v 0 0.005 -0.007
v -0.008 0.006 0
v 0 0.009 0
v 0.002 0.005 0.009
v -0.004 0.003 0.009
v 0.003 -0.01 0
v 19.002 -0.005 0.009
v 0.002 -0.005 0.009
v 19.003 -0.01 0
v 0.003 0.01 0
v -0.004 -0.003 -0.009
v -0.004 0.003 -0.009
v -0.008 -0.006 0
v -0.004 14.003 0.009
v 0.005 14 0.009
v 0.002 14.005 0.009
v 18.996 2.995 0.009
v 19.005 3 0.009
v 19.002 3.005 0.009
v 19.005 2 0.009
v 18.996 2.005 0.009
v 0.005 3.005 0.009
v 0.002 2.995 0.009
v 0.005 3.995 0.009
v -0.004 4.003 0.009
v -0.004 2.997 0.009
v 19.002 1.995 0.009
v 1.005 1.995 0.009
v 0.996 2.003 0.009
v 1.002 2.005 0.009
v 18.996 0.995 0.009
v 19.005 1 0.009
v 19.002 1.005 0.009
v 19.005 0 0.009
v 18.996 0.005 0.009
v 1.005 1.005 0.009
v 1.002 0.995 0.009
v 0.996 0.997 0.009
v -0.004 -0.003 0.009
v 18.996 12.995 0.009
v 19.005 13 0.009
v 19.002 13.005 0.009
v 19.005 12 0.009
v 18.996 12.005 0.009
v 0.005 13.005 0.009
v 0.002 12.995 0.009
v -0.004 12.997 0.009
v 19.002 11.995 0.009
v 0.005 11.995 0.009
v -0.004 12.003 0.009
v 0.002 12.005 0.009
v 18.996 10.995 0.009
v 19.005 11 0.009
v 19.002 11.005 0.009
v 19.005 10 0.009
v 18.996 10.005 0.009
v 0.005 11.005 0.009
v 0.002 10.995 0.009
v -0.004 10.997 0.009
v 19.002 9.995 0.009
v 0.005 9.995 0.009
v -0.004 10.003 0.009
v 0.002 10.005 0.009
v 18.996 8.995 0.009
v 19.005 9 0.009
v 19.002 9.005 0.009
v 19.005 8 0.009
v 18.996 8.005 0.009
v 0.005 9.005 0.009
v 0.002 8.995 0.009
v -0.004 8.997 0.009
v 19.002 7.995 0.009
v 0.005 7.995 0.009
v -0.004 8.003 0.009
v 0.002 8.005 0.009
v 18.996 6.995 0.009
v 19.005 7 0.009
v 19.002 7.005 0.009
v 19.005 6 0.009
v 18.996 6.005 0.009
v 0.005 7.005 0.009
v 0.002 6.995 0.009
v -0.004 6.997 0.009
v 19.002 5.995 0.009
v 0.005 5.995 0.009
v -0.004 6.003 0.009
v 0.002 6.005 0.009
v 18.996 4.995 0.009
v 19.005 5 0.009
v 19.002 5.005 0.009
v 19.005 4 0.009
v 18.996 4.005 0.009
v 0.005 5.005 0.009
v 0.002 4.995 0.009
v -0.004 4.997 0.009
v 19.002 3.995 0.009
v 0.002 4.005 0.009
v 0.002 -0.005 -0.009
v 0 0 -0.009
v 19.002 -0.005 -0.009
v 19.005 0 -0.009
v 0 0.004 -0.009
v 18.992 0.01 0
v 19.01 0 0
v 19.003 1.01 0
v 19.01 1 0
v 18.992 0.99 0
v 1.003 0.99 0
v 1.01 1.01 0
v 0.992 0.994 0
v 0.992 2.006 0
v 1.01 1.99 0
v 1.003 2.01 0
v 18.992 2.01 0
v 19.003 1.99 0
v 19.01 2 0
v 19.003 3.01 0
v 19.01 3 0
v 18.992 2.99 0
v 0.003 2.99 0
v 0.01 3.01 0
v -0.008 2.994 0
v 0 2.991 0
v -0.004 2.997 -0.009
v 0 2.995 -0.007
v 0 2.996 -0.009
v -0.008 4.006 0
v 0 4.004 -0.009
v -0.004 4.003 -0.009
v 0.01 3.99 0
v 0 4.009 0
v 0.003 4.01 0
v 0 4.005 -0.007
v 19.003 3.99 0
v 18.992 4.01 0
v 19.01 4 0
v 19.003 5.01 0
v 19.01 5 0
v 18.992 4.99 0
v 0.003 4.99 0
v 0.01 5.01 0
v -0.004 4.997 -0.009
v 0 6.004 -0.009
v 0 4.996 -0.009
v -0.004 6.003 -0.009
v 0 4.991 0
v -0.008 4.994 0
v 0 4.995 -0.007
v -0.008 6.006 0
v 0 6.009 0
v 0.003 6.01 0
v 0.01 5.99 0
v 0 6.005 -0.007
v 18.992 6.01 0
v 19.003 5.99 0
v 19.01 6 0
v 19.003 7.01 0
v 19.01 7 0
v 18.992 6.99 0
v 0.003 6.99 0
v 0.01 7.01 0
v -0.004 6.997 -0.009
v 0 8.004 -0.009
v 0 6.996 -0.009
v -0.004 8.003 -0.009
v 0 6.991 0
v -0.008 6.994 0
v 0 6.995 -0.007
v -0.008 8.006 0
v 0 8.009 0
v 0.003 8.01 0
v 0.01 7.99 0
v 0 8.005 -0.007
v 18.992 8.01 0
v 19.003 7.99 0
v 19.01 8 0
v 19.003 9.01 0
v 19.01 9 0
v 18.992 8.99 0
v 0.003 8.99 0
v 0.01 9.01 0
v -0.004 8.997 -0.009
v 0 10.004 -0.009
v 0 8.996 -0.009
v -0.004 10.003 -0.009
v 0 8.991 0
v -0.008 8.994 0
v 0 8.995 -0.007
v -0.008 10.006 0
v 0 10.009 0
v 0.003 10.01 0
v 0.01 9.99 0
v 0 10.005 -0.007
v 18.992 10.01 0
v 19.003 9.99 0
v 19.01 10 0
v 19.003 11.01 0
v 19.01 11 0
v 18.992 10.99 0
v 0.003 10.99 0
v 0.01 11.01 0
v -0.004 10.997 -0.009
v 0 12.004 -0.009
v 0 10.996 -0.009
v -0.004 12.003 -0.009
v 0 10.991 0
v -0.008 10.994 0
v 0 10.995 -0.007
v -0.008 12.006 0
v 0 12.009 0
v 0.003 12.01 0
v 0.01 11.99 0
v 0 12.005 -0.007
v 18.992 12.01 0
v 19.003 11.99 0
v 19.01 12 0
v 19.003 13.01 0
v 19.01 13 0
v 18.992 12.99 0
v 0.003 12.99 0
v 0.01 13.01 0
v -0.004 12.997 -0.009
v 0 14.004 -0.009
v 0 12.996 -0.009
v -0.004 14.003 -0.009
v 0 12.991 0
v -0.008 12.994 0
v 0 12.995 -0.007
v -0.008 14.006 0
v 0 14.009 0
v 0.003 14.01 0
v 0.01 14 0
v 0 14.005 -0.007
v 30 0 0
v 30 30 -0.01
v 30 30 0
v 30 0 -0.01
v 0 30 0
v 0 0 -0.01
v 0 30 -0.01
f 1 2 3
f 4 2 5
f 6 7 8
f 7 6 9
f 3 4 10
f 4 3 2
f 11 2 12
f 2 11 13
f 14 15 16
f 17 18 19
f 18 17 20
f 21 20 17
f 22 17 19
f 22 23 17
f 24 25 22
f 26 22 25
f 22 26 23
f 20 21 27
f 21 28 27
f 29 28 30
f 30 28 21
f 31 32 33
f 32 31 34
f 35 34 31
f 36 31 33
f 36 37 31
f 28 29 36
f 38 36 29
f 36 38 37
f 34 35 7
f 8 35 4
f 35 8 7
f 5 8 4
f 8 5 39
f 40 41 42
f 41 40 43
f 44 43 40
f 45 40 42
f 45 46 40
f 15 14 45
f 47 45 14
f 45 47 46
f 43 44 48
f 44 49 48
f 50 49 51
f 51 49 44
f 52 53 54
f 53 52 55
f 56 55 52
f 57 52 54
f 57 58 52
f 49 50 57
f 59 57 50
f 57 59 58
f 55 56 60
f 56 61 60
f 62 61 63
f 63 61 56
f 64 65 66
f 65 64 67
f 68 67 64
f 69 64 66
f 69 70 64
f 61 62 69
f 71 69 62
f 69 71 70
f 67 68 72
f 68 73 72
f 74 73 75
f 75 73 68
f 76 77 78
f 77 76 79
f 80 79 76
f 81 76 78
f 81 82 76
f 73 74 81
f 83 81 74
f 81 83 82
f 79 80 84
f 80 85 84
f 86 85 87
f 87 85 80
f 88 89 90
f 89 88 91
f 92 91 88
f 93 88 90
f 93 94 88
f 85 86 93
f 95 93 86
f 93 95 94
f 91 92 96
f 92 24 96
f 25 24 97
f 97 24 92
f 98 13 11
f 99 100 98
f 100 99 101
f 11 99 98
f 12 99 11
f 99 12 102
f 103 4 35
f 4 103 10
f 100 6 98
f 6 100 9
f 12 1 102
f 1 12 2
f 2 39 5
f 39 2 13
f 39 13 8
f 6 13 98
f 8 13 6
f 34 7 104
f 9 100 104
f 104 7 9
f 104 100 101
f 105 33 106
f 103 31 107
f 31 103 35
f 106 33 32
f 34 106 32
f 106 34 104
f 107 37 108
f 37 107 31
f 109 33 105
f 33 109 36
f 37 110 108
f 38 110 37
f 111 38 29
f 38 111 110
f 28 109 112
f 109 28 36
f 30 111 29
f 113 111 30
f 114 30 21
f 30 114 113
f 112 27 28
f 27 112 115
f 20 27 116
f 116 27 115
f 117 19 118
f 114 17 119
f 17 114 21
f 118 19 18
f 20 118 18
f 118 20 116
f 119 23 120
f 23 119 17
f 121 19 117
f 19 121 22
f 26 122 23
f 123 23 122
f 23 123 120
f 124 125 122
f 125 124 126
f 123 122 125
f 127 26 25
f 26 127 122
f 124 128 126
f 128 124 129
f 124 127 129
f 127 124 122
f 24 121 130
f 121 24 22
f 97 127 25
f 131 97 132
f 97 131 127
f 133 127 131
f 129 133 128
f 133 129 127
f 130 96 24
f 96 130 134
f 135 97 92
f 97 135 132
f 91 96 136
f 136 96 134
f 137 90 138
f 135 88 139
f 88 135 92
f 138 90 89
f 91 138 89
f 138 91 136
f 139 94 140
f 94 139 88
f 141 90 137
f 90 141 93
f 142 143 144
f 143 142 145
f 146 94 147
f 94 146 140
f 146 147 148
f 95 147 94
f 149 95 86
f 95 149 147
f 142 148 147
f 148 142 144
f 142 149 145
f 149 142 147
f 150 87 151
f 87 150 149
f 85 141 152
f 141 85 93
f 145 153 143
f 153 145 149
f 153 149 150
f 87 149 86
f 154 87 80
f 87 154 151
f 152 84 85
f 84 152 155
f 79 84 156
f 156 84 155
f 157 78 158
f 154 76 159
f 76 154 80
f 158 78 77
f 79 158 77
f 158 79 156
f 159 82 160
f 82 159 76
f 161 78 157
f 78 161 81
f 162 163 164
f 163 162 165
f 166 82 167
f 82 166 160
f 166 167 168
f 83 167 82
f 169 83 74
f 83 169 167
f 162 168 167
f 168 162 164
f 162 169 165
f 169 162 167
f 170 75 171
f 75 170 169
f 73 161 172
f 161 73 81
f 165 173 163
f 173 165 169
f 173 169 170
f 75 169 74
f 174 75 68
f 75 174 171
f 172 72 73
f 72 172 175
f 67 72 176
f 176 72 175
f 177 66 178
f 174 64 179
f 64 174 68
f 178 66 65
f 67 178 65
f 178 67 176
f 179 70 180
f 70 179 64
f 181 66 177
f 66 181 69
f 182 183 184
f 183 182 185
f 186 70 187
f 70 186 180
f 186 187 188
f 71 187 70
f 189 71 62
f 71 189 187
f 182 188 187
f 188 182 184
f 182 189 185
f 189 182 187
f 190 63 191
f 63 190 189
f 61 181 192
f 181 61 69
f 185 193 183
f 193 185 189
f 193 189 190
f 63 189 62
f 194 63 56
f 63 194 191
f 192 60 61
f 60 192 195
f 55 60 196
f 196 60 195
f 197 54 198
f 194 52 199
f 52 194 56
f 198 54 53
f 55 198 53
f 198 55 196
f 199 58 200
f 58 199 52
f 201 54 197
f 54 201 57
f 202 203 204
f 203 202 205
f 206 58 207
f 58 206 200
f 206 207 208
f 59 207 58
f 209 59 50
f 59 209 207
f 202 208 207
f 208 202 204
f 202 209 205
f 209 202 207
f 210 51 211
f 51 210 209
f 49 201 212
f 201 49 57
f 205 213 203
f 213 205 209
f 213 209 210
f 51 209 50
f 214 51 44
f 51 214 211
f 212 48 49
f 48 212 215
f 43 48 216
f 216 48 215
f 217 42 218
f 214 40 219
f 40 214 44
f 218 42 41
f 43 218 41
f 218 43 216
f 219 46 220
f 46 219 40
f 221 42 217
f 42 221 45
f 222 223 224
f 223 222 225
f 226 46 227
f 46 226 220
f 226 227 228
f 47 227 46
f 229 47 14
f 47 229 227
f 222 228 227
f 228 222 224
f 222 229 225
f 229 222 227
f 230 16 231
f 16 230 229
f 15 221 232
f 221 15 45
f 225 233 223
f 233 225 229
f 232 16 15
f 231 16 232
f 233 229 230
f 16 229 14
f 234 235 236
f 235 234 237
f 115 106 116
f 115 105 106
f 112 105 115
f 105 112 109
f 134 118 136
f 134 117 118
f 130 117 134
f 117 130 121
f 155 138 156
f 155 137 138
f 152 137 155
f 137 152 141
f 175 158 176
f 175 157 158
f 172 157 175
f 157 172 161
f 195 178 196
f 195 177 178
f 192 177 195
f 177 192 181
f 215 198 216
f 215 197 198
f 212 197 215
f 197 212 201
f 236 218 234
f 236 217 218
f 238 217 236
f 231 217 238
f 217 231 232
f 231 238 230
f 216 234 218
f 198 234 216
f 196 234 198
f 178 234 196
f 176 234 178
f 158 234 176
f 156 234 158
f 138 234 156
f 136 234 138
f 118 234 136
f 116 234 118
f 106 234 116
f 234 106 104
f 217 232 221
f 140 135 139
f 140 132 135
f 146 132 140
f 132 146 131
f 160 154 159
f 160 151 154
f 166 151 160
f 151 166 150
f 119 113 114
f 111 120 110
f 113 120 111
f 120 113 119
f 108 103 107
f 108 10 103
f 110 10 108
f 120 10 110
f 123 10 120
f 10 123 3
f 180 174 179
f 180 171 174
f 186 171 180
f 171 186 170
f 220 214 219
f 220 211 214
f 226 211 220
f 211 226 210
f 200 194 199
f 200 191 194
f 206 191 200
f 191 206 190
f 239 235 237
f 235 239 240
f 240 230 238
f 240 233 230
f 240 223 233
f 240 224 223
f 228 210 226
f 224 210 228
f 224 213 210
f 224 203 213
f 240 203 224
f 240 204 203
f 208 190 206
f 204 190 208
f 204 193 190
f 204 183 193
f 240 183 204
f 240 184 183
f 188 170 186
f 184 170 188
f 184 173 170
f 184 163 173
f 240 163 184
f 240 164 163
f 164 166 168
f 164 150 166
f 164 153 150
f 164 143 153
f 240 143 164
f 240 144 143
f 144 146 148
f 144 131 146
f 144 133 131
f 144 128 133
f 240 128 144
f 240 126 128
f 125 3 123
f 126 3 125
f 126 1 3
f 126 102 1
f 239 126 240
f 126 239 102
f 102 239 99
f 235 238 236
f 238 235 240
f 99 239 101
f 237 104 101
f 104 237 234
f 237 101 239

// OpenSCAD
hull(){
    translate([0, 0]) sphere(0.01);
    translate([1, 0]) sphere(0.01);
}
hull(){
    translate([1, 0]) sphere(0.01);
    translate([2, 0]) sphere(0.01);
}
hull(){
    translate([2, 0]) sphere(0.01);
    translate([3, 0]) sphere(0.01);
}
hull(){
    translate([3, 0]) sphere(0.01);
    translate([4, 0]) sphere(0.01);
}
hull(){
    translate([4, 0]) sphere(0.01);
    translate([5, 0]) sphere(0.01);
}
hull(){
    translate([5, 0]) sphere(0.01);
    translate([6, 0]) sphere(0.01);
}
hull(){
    translate([6, 0]) sphere(0.01);
    translate([7, 0]) sphere(0.01);
}
hull(){
    translate([7, 0]) sphere(0.01);
    translate([8, 0]) sphere(0.01);
}
hull(){
    translate([8, 0]) sphere(0.01);
    translate([9, 0]) sphere(0.01);
}
hull(){
    translate([9, 0]) sphere(0.01);
    translate([10, 0]) sphere(0.01);
}
hull(){
    translate([10, 0]) sphere(0.01);
    translate([11, 0]) sphere(0.01);
}
hull(){
    translate([11, 0]) sphere(0.01);
    translate([12, 0]) sphere(0.01);
}
hull(){
    translate([12, 0]) sphere(0.01);
    translate([13, 0]) sphere(0.01);
}
hull(){
    translate([13, 0]) sphere(0.01);
    translate([14, 0]) sphere(0.01);
}
hull(){
    translate([14, 0]) sphere(0.01);
    translate([15, 0]) sphere(0.01);
}
hull(){
    translate([15, 0]) sphere(0.01);
    translate([16, 0]) sphere(0.01);
}
hull(){
    translate([16, 0]) sphere(0.01);
    translate([17, 0]) sphere(0.01);
}
hull(){
    translate([17, 0]) sphere(0.01);
    translate([18, 0]) sphere(0.01);
}
hull(){
    translate([18, 0]) sphere(0.01);
    translate([19, 0]) sphere(0.01);
}
hull(){
    translate([19, 0]) sphere(0.01);
    translate([19, 1]) sphere(0.01);
}
hull(){
    translate([19, 1]) sphere(0.01);
    translate([18, 1]) sphere(0.01);
}
hull(){
    translate([18, 1]) sphere(0.01);
    translate([17, 1]) sphere(0.01);
}
hull(){
    translate([17, 1]) sphere(0.01);
    translate([16, 1]) sphere(0.01);
}
hull(){
    translate([16, 1]) sphere(0.01);
    translate([15, 1]) sphere(0.01);
}
hull(){
    translate([15, 1]) sphere(0.01);
    translate([14, 1]) sphere(0.01);
}
hull(){
    translate([14, 1]) sphere(0.01);
    translate([13, 1]) sphere(0.01);
}
hull(){
    translate([13, 1]) sphere(0.01);
    translate([12, 1]) sphere(0.01);
}
hull(){
    translate([12, 1]) sphere(0.01);
    translate([11, 1]) sphere(0.01);
}
hull(){
    translate([11, 1]) sphere(0.01);
    translate([10, 1]) sphere(0.01);
}
hull(){
    translate([10, 1]) sphere(0.01);
    translate([9, 1]) sphere(0.01);
}
hull(){
    translate([9, 1]) sphere(0.01);
    translate([8, 1]) sphere(0.01);
}
hull(){
    translate([8, 1]) sphere(0.01);
    translate([7, 1]) sphere(0.01);
}
hull(){
    translate([7, 1]) sphere(0.01);
    translate([6, 1]) sphere(0.01);
}
hull(){
    translate([6, 1]) sphere(0.01);
    translate([5, 1]) sphere(0.01);
}
hull(){
    translate([5, 1]) sphere(0.01);
    translate([4, 1]) sphere(0.01);
}
hull(){
    translate([4, 1]) sphere(0.01);
    translate([3, 1]) sphere(0.01);
}
hull(){
    translate([3, 1]) sphere(0.01);
    translate([2, 1]) sphere(0.01);
}
hull(){
    translate([2, 1]) sphere(0.01);
    translate([1, 1]) sphere(0.01);
}
hull(){
    translate([1, 1]) sphere(0.01);
    translate([1, 2]) sphere(0.01);
}
hull(){
    translate([1, 2]) sphere(0.01);
    translate([2, 2]) sphere(0.01);
}
hull(){
    translate([2, 2]) sphere(0.01);
    translate([3, 2]) sphere(0.01);
}
hull(){
    translate([3, 2]) sphere(0.01);
    translate([4, 2]) sphere(0.01);
}
hull(){
    translate([4, 2]) sphere(0.01);
    translate([5, 2]) sphere(0.01);
}
hull(){
    translate([5, 2]) sphere(0.01);
    translate([6, 2]) sphere(0.01);
}
hull(){
    translate([6, 2]) sphere(0.01);
    translate([7, 2]) sphere(0.01);
}
hull(){
    translate([7, 2]) sphere(0.01);
    translate([8, 2]) sphere(0.01);
}
hull(){
    translate([8, 2]) sphere(0.01);
    translate([9, 2]) sphere(0.01);
}
hull(){
    translate([9, 2]) sphere(0.01);
    translate([10, 2]) sphere(0.01);
}
hull(){
    translate([10, 2]) sphere(0.01);
    translate([11, 2]) sphere(0.01);
}
hull(){
    translate([11, 2]) sphere(0.01);
    translate([12, 2]) sphere(0.01);
}
hull(){
    translate([12, 2]) sphere(0.01);
    translate([13, 2]) sphere(0.01);
}
hull(){
    translate([13, 2]) sphere(0.01);
    translate([14, 2]) sphere(0.01);
}
hull(){
    translate([14, 2]) sphere(0.01);
    translate([15, 2]) sphere(0.01);
}
hull(){
    translate([15, 2]) sphere(0.01);
    translate([16, 2]) sphere(0.01);
}
hull(){
    translate([16, 2]) sphere(0.01);
    translate([17, 2]) sphere(0.01);
}
hull(){
    translate([17, 2]) sphere(0.01);
    translate([18, 2]) sphere(0.01);
}
hull(){
    translate([18, 2]) sphere(0.01);
    translate([19, 2]) sphere(0.01);
}
hull(){
    translate([19, 2]) sphere(0.01);
    translate([19, 3]) sphere(0.01);
}
hull(){
    translate([19, 3]) sphere(0.01);
    translate([18, 3]) sphere(0.01);
}
hull(){
    translate([18, 3]) sphere(0.01);
    translate([17, 3]) sphere(0.01);
}
hull(){
    translate([17, 3]) sphere(0.01);
    translate([16, 3]) sphere(0.01);
}
hull(){
    translate([16, 3]) sphere(0.01);
    translate([15, 3]) sphere(0.01);
}
hull(){
    translate([15, 3]) sphere(0.01);
    translate([14, 3]) sphere(0.01);
}
hull(){
    translate([14, 3]) sphere(0.01);
    translate([13, 3]) sphere(0.01);
}
hull(){
    translate([13, 3]) sphere(0.01);
    translate([12, 3]) sphere(0.01);
}
hull(){
    translate([12, 3]) sphere(0.01);
    translate([11, 3]) sphere(0.01);
}
hull(){
    translate([11, 3]) sphere(0.01);
    translate([10, 3]) sphere(0.01);
}
hull(){
    translate([10, 3]) sphere(0.01);
    translate([9, 3]) sphere(0.01);
}
hull(){
    translate([9, 3]) sphere(0.01);
    translate([8, 3]) sphere(0.01);
}
hull(){
    translate([8, 3]) sphere(0.01);
    translate([7, 3]) sphere(0.01);
}
hull(){
    translate([7, 3]) sphere(0.01);
    translate([6, 3]) sphere(0.01);
}
hull(){
    translate([6, 3]) sphere(0.01);
    translate([5, 3]) sphere(0.01);
}
hull(){
    translate([5, 3]) sphere(0.01);
    translate([4, 3]) sphere(0.01);
}
hull(){
    translate([4, 3]) sphere(0.01);
    translate([3, 3]) sphere(0.01);
}
hull(){
    translate([3, 3]) sphere(0.01);
    translate([2, 3]) sphere(0.01);
}
hull(){
    translate([2, 3]) sphere(0.01);
    translate([1, 3]) sphere(0.01);
}
hull(){
    translate([1, 3]) sphere(0.01);
    translate([0, 3]) sphere(0.01);
}
hull(){
    translate([0, 3]) sphere(0.01);
    translate([0, 4]) sphere(0.01);
}
hull(){
    translate([0, 4]) sphere(0.01);
    translate([1, 4]) sphere(0.01);
}
hull(){
    translate([1, 4]) sphere(0.01);
    translate([2, 4]) sphere(0.01);
}
hull(){
    translate([2, 4]) sphere(0.01);
    translate([3, 4]) sphere(0.01);
}
hull(){
    translate([3, 4]) sphere(0.01);
    translate([4, 4]) sphere(0.01);
}
hull(){
    translate([4, 4]) sphere(0.01);
    translate([5, 4]) sphere(0.01);
}
hull(){
    translate([5, 4]) sphere(0.01);
    translate([6, 4]) sphere(0.01);
}
hull(){
    translate([6, 4]) sphere(0.01);
    translate([7, 4]) sphere(0.01);
}
hull(){
    translate([7, 4]) sphere(0.01);
    translate([8, 4]) sphere(0.01);
}
hull(){
    translate([8, 4]) sphere(0.01);
    translate([9, 4]) sphere(0.01);
}
hull(){
    translate([9, 4]) sphere(0.01);
    translate([10, 4]) sphere(0.01);
}
hull(){
    translate([10, 4]) sphere(0.01);
    translate([11, 4]) sphere(0.01);
}
hull(){
    translate([11, 4]) sphere(0.01);
    translate([12, 4]) sphere(0.01);
}
hull(){
    translate([12, 4]) sphere(0.01);
    translate([13, 4]) sphere(0.01);
}
hull(){
    translate([13, 4]) sphere(0.01);
    translate([14, 4]) sphere(0.01);
}
hull(){
    translate([14, 4]) sphere(0.01);
    translate([15, 4]) sphere(0.01);
}
hull(){
    translate([15, 4]) sphere(0.01);
    translate([16, 4]) sphere(0.01);
}
hull(){
    translate([16, 4]) sphere(0.01);
    translate([17, 4]) sphere(0.01);
}
hull(){
    translate([17, 4]) sphere(0.01);
    translate([18, 4]) sphere(0.01);
}
hull(){
    translate([18, 4]) sphere(0.01);
    translate([19, 4]) sphere(0.01);
}
hull(){
    translate([19, 4]) sphere(0.01);
    translate([19, 5]) sphere(0.01);
}
hull(){
    translate([19, 5]) sphere(0.01);
    translate([18, 5]) sphere(0.01);
}
hull(){
    translate([18, 5]) sphere(0.01);
    translate([17, 5]) sphere(0.01);
}
hull(){
    translate([17, 5]) sphere(0.01);
    translate([16, 5]) sphere(0.01);
}
hull(){
    translate([16, 5]) sphere(0.01);
    translate([15, 5]) sphere(0.01);
}
hull(){
    translate([15, 5]) sphere(0.01);
    translate([14, 5]) sphere(0.01);
}
hull(){
    translate([14, 5]) sphere(0.01);
    translate([13, 5]) sphere(0.01);
}
hull(){
    translate([13, 5]) sphere(0.01);
    translate([12, 5]) sphere(0.01);
}
hull(){
    translate([12, 5]) sphere(0.01);
    translate([11, 5]) sphere(0.01);
}
hull(){
    translate([11, 5]) sphere(0.01);
    translate([10, 5]) sphere(0.01);
}
hull(){
    translate([10, 5]) sphere(0.01);
    translate([9, 5]) sphere(0.01);
}
hull(){
    translate([9, 5]) sphere(0.01);
    translate([8, 5]) sphere(0.01);
}
hull(){
    translate([8, 5]) sphere(0.01);
    translate([7, 5]) sphere(0.01);
}
hull(){
    translate([7, 5]) sphere(0.01);
    translate([6, 5]) sphere(0.01);
}
hull(){
    translate([6, 5]) sphere(0.01);
    translate([5, 5]) sphere(0.01);
}
hull(){
    translate([5, 5]) sphere(0.01);
    translate([4, 5]) sphere(0.01);
}
hull(){
    translate([4, 5]) sphere(0.01);
    translate([3, 5]) sphere(0.01);
}
hull(){
    translate([3, 5]) sphere(0.01);
    translate([2, 5]) sphere(0.01);
}
hull(){
    translate([2, 5]) sphere(0.01);
    translate([1, 5]) sphere(0.01);
}
hull(){
    translate([1, 5]) sphere(0.01);
    translate([0, 5]) sphere(0.01);
}
hull(){
    translate([0, 5]) sphere(0.01);
    translate([0, 6]) sphere(0.01);
}
hull(){
    translate([0, 6]) sphere(0.01);
    translate([1, 6]) sphere(0.01);
}
hull(){
    translate([1, 6]) sphere(0.01);
    translate([2, 6]) sphere(0.01);
}
hull(){
    translate([2, 6]) sphere(0.01);
    translate([3, 6]) sphere(0.01);
}
hull(){
    translate([3, 6]) sphere(0.01);
    translate([4, 6]) sphere(0.01);
}
hull(){
    translate([4, 6]) sphere(0.01);
    translate([5, 6]) sphere(0.01);
}
hull(){
    translate([5, 6]) sphere(0.01);
    translate([6, 6]) sphere(0.01);
}
hull(){
    translate([6, 6]) sphere(0.01);
    translate([7, 6]) sphere(0.01);
}
hull(){
    translate([7, 6]) sphere(0.01);
    translate([8, 6]) sphere(0.01);
}
hull(){
    translate([8, 6]) sphere(0.01);
    translate([9, 6]) sphere(0.01);
}
hull(){
    translate([9, 6]) sphere(0.01);
    translate([10, 6]) sphere(0.01);
}
hull(){
    translate([10, 6]) sphere(0.01);
    translate([11, 6]) sphere(0.01);
}
hull(){
    translate([11, 6]) sphere(0.01);
    translate([12, 6]) sphere(0.01);
}
hull(){
    translate([12, 6]) sphere(0.01);
    translate([13, 6]) sphere(0.01);
}
hull(){
    translate([13, 6]) sphere(0.01);
    translate([14, 6]) sphere(0.01);
}
hull(){
    translate([14, 6]) sphere(0.01);
    translate([15, 6]) sphere(0.01);
}
hull(){
    translate([15, 6]) sphere(0.01);
    translate([16, 6]) sphere(0.01);
}
hull(){
    translate([16, 6]) sphere(0.01);
    translate([17, 6]) sphere(0.01);
}
hull(){
    translate([17, 6]) sphere(0.01);
    translate([18, 6]) sphere(0.01);
}
hull(){
    translate([18, 6]) sphere(0.01);
    translate([19, 6]) sphere(0.01);
}
hull(){
    translate([19, 6]) sphere(0.01);
    translate([19, 7]) sphere(0.01);
}
hull(){
    translate([19, 7]) sphere(0.01);
    translate([18, 7]) sphere(0.01);
}
hull(){
    translate([18, 7]) sphere(0.01);
    translate([17, 7]) sphere(0.01);
}
hull(){
    translate([17, 7]) sphere(0.01);
    translate([16, 7]) sphere(0.01);
}
hull(){
    translate([16, 7]) sphere(0.01);
    translate([15, 7]) sphere(0.01);
}
hull(){
    translate([15, 7]) sphere(0.01);
    translate([14, 7]) sphere(0.01);
}
hull(){
    translate([14, 7]) sphere(0.01);
    translate([13, 7]) sphere(0.01);
}
hull(){
    translate([13, 7]) sphere(0.01);
    translate([12, 7]) sphere(0.01);
}
hull(){
    translate([12, 7]) sphere(0.01);
    translate([11, 7]) sphere(0.01);
}
hull(){
    translate([11, 7]) sphere(0.01);
    translate([10, 7]) sphere(0.01);
}
hull(){
    translate([10, 7]) sphere(0.01);
    translate([9, 7]) sphere(0.01);
}
hull(){
    translate([9, 7]) sphere(0.01);
    translate([8, 7]) sphere(0.01);
}
hull(){
    translate([8, 7]) sphere(0.01);
    translate([7, 7]) sphere(0.01);
}
hull(){
    translate([7, 7]) sphere(0.01);
    translate([6, 7]) sphere(0.01);
}
hull(){
    translate([6, 7]) sphere(0.01);
    translate([5, 7]) sphere(0.01);
}
hull(){
    translate([5, 7]) sphere(0.01);
    translate([4, 7]) sphere(0.01);
}
hull(){
    translate([4, 7]) sphere(0.01);
    translate([3, 7]) sphere(0.01);
}
hull(){
    translate([3, 7]) sphere(0.01);
    translate([2, 7]) sphere(0.01);
}
hull(){
    translate([2, 7]) sphere(0.01);
    translate([1, 7]) sphere(0.01);
}
hull(){
    translate([1, 7]) sphere(0.01);
    translate([0, 7]) sphere(0.01);
}
hull(){
    translate([0, 7]) sphere(0.01);
    translate([0, 8]) sphere(0.01);
}
hull(){
    translate([0, 8]) sphere(0.01);
    translate([1, 8]) sphere(0.01);
}
hull(){
    translate([1, 8]) sphere(0.01);
    translate([2, 8]) sphere(0.01);
}
hull(){
    translate([2, 8]) sphere(0.01);
    translate([3, 8]) sphere(0.01);
}
hull(){
    translate([3, 8]) sphere(0.01);
    translate([4, 8]) sphere(0.01);
}
hull(){
    translate([4, 8]) sphere(0.01);
    translate([5, 8]) sphere(0.01);
}
hull(){
    translate([5, 8]) sphere(0.01);
    translate([6, 8]) sphere(0.01);
}
hull(){
    translate([6, 8]) sphere(0.01);
    translate([7, 8]) sphere(0.01);
}
hull(){
    translate([7, 8]) sphere(0.01);
    translate([8, 8]) sphere(0.01);
}
hull(){
    translate([8, 8]) sphere(0.01);
    translate([9, 8]) sphere(0.01);
}
hull(){
    translate([9, 8]) sphere(0.01);
    translate([10, 8]) sphere(0.01);
}
hull(){
    translate([10, 8]) sphere(0.01);
    translate([11, 8]) sphere(0.01);
}
hull(){
    translate([11, 8]) sphere(0.01);
    translate([12, 8]) sphere(0.01);
}
hull(){
    translate([12, 8]) sphere(0.01);
    translate([13, 8]) sphere(0.01);
}
hull(){
    translate([13, 8]) sphere(0.01);
    translate([14, 8]) sphere(0.01);
}
hull(){
    translate([14, 8]) sphere(0.01);
    translate([15, 8]) sphere(0.01);
}
hull(){
    translate([15, 8]) sphere(0.01);
    translate([16, 8]) sphere(0.01);
}
hull(){
    translate([16, 8]) sphere(0.01);
    translate([17, 8]) sphere(0.01);
}
hull(){
    translate([17, 8]) sphere(0.01);
    translate([18, 8]) sphere(0.01);
}
hull(){
    translate([18, 8]) sphere(0.01);
    translate([19, 8]) sphere(0.01);
}
hull(){
    translate([19, 8]) sphere(0.01);
    translate([19, 9]) sphere(0.01);
}
hull(){
    translate([19, 9]) sphere(0.01);
    translate([18, 9]) sphere(0.01);
}
hull(){
    translate([18, 9]) sphere(0.01);
    translate([17, 9]) sphere(0.01);
}
hull(){
    translate([17, 9]) sphere(0.01);
    translate([16, 9]) sphere(0.01);
}
hull(){
    translate([16, 9]) sphere(0.01);
    translate([15, 9]) sphere(0.01);
}
hull(){
    translate([15, 9]) sphere(0.01);
    translate([14, 9]) sphere(0.01);
}
hull(){
    translate([14, 9]) sphere(0.01);
    translate([13, 9]) sphere(0.01);
}
hull(){
    translate([13, 9]) sphere(0.01);
    translate([12, 9]) sphere(0.01);
}
hull(){
    translate([12, 9]) sphere(0.01);
    translate([11, 9]) sphere(0.01);
}
hull(){
    translate([11, 9]) sphere(0.01);
    translate([10, 9]) sphere(0.01);
}
hull(){
    translate([10, 9]) sphere(0.01);
    translate([9, 9]) sphere(0.01);
}
hull(){
    translate([9, 9]) sphere(0.01);
    translate([8, 9]) sphere(0.01);
}
hull(){
    translate([8, 9]) sphere(0.01);
    translate([7, 9]) sphere(0.01);
}
hull(){
    translate([7, 9]) sphere(0.01);
    translate([6, 9]) sphere(0.01);
}
hull(){
    translate([6, 9]) sphere(0.01);
    translate([5, 9]) sphere(0.01);
}
hull(){
    translate([5, 9]) sphere(0.01);
    translate([4, 9]) sphere(0.01);
}
hull(){
    translate([4, 9]) sphere(0.01);
    translate([3, 9]) sphere(0.01);
}
hull(){
    translate([3, 9]) sphere(0.01);
    translate([2, 9]) sphere(0.01);
}
hull(){
    translate([2, 9]) sphere(0.01);
    translate([1, 9]) sphere(0.01);
}
hull(){
    translate([1, 9]) sphere(0.01);
    translate([0, 9]) sphere(0.01);
}
hull(){
    translate([0, 9]) sphere(0.01);
    translate([0, 10]) sphere(0.01);
}
hull(){
    translate([0, 10]) sphere(0.01);
    translate([1, 10]) sphere(0.01);
}
hull(){
    translate([1, 10]) sphere(0.01);
    translate([2, 10]) sphere(0.01);
}
hull(){
    translate([2, 10]) sphere(0.01);
    translate([3, 10]) sphere(0.01);
}
hull(){
    translate([3, 10]) sphere(0.01);
    translate([4, 10]) sphere(0.01);
}
hull(){
    translate([4, 10]) sphere(0.01);
    translate([5, 10]) sphere(0.01);
}
hull(){
    translate([5, 10]) sphere(0.01);
    translate([6, 10]) sphere(0.01);
}
hull(){
    translate([6, 10]) sphere(0.01);
    translate([7, 10]) sphere(0.01);
}
hull(){
    translate([7, 10]) sphere(0.01);
    translate([8, 10]) sphere(0.01);
}
hull(){
    translate([8, 10]) sphere(0.01);
    translate([9, 10]) sphere(0.01);
}
hull(){
    translate([9, 10]) sphere(0.01);
    translate([10, 10]) sphere(0.01);
}
hull(){
    translate([10, 10]) sphere(0.01);
    translate([11, 10]) sphere(0.01);
}
hull(){
    translate([11, 10]) sphere(0.01);
    translate([12, 10]) sphere(0.01);
}
hull(){
    translate([12, 10]) sphere(0.01);
    translate([13, 10]) sphere(0.01);
}
hull(){
    translate([13, 10]) sphere(0.01);
    translate([14, 10]) sphere(0.01);
}
hull(){
    translate([14, 10]) sphere(0.01);
    translate([15, 10]) sphere(0.01);
}
hull(){
    translate([15, 10]) sphere(0.01);
    translate([16, 10]) sphere(0.01);
}
hull(){
    translate([16, 10]) sphere(0.01);
    translate([17, 10]) sphere(0.01);
}
hull(){
    translate([17, 10]) sphere(0.01);
    translate([18, 10]) sphere(0.01);
}
hull(){
    translate([18, 10]) sphere(0.01);
    translate([19, 10]) sphere(0.01);
}
hull(){
    translate([19, 10]) sphere(0.01);
    translate([19, 11]) sphere(0.01);
}
hull(){
    translate([19, 11]) sphere(0.01);
    translate([18, 11]) sphere(0.01);
}
hull(){
    translate([18, 11]) sphere(0.01);
    translate([17, 11]) sphere(0.01);
}
hull(){
    translate([17, 11]) sphere(0.01);
    translate([16, 11]) sphere(0.01);
}
hull(){
    translate([16, 11]) sphere(0.01);
    translate([15, 11]) sphere(0.01);
}
hull(){
    translate([15, 11]) sphere(0.01);
    translate([14, 11]) sphere(0.01);
}
hull(){
    translate([14, 11]) sphere(0.01);
    translate([13, 11]) sphere(0.01);
}
hull(){
    translate([13, 11]) sphere(0.01);
    translate([12, 11]) sphere(0.01);
}
hull(){
    translate([12, 11]) sphere(0.01);
    translate([11, 11]) sphere(0.01);
}
hull(){
    translate([11, 11]) sphere(0.01);
    translate([10, 11]) sphere(0.01);
}
hull(){
    translate([10, 11]) sphere(0.01);
    translate([9, 11]) sphere(0.01);
}
hull(){
    translate([9, 11]) sphere(0.01);
    translate([8, 11]) sphere(0.01);
}
hull(){
    translate([8, 11]) sphere(0.01);
    translate([7, 11]) sphere(0.01);
}
hull(){
    translate([7, 11]) sphere(0.01);
    translate([6, 11]) sphere(0.01);
}
hull(){
    translate([6, 11]) sphere(0.01);
    translate([5, 11]) sphere(0.01);
}
hull(){
    translate([5, 11]) sphere(0.01);
    translate([4, 11]) sphere(0.01);
}
hull(){
    translate([4, 11]) sphere(0.01);
    translate([3, 11]) sphere(0.01);
}
hull(){
    translate([3, 11]) sphere(0.01);
    translate([2, 11]) sphere(0.01);
}
hull(){
    translate([2, 11]) sphere(0.01);
    translate([1, 11]) sphere(0.01);
}
hull(){
    translate([1, 11]) sphere(0.01);
    translate([0, 11]) sphere(0.01);
}
hull(){
    translate([0, 11]) sphere(0.01);
    translate([0, 12]) sphere(0.01);
}
hull(){
    translate([0, 12]) sphere(0.01);
    translate([1, 12]) sphere(0.01);
}
hull(){
    translate([1, 12]) sphere(0.01);
    translate([2, 12]) sphere(0.01);
}
hull(){
    translate([2, 12]) sphere(0.01);
    translate([3, 12]) sphere(0.01);
}
hull(){
    translate([3, 12]) sphere(0.01);
    translate([4, 12]) sphere(0.01);
}
hull(){
    translate([4, 12]) sphere(0.01);
    translate([5, 12]) sphere(0.01);
}
hull(){
    translate([5, 12]) sphere(0.01);
    translate([6, 12]) sphere(0.01);
}
hull(){
    translate([6, 12]) sphere(0.01);
    translate([7, 12]) sphere(0.01);
}
hull(){
    translate([7, 12]) sphere(0.01);
    translate([8, 12]) sphere(0.01);
}
hull(){
    translate([8, 12]) sphere(0.01);
    translate([9, 12]) sphere(0.01);
}
hull(){
    translate([9, 12]) sphere(0.01);
    translate([10, 12]) sphere(0.01);
}
hull(){
    translate([10, 12]) sphere(0.01);
    translate([11, 12]) sphere(0.01);
}
hull(){
    translate([11, 12]) sphere(0.01);
    translate([12, 12]) sphere(0.01);
}
hull(){
    translate([12, 12]) sphere(0.01);
    translate([13, 12]) sphere(0.01);
}
hull(){
    translate([13, 12]) sphere(0.01);
    translate([14, 12]) sphere(0.01);
}
hull(){
    translate([14, 12]) sphere(0.01);
    translate([15, 12]) sphere(0.01);
}
hull(){
    translate([15, 12]) sphere(0.01);
    translate([16, 12]) sphere(0.01);
}
hull(){
    translate([16, 12]) sphere(0.01);
    translate([17, 12]) sphere(0.01);
}
hull(){
    translate([17, 12]) sphere(0.01);
    translate([18, 12]) sphere(0.01);
}
hull(){
    translate([18, 12]) sphere(0.01);
    translate([19, 12]) sphere(0.01);
}
hull(){
    translate([19, 12]) sphere(0.01);
    translate([19, 13]) sphere(0.01);
}
hull(){
    translate([19, 13]) sphere(0.01);
    translate([18, 13]) sphere(0.01);
}
hull(){
    translate([18, 13]) sphere(0.01);
    translate([17, 13]) sphere(0.01);
}
hull(){
    translate([17, 13]) sphere(0.01);
    translate([16, 13]) sphere(0.01);
}
hull(){
    translate([16, 13]) sphere(0.01);
    translate([15, 13]) sphere(0.01);
}
hull(){
    translate([15, 13]) sphere(0.01);
    translate([14, 13]) sphere(0.01);
}
hull(){
    translate([14, 13]) sphere(0.01);
    translate([13, 13]) sphere(0.01);
}
hull(){
    translate([13, 13]) sphere(0.01);
    translate([12, 13]) sphere(0.01);
}
hull(){
    translate([12, 13]) sphere(0.01);
    translate([11, 13]) sphere(0.01);
}
hull(){
    translate([11, 13]) sphere(0.01);
    translate([10, 13]) sphere(0.01);
}
hull(){
    translate([10, 13]) sphere(0.01);
    translate([9, 13]) sphere(0.01);
}
hull(){
    translate([9, 13]) sphere(0.01);
    translate([8, 13]) sphere(0.01);
}
hull(){
    translate([8, 13]) sphere(0.01);
    translate([7, 13]) sphere(0.01);
}
hull(){
    translate([7, 13]) sphere(0.01);
    translate([6, 13]) sphere(0.01);
}
hull(){
    translate([6, 13]) sphere(0.01);
    translate([5, 13]) sphere(0.01);
}
hull(){
    translate([5, 13]) sphere(0.01);
    translate([4, 13]) sphere(0.01);
}
hull(){
    translate([4, 13]) sphere(0.01);
    translate([3, 13]) sphere(0.01);
}
hull(){
    translate([3, 13]) sphere(0.01);
    translate([2, 13]) sphere(0.01);
}
hull(){
    translate([2, 13]) sphere(0.01);
    translate([1, 13]) sphere(0.01);
}
hull(){
    translate([1, 13]) sphere(0.01);
    translate([0, 13]) sphere(0.01);
}
hull(){
    translate([0, 13]) sphere(0.01);
    translate([0, 14]) sphere(0.01);
}
translate([0,0,-0.01]) color([0.1,0.1,0.1]) cube([30,30,0.01]);
